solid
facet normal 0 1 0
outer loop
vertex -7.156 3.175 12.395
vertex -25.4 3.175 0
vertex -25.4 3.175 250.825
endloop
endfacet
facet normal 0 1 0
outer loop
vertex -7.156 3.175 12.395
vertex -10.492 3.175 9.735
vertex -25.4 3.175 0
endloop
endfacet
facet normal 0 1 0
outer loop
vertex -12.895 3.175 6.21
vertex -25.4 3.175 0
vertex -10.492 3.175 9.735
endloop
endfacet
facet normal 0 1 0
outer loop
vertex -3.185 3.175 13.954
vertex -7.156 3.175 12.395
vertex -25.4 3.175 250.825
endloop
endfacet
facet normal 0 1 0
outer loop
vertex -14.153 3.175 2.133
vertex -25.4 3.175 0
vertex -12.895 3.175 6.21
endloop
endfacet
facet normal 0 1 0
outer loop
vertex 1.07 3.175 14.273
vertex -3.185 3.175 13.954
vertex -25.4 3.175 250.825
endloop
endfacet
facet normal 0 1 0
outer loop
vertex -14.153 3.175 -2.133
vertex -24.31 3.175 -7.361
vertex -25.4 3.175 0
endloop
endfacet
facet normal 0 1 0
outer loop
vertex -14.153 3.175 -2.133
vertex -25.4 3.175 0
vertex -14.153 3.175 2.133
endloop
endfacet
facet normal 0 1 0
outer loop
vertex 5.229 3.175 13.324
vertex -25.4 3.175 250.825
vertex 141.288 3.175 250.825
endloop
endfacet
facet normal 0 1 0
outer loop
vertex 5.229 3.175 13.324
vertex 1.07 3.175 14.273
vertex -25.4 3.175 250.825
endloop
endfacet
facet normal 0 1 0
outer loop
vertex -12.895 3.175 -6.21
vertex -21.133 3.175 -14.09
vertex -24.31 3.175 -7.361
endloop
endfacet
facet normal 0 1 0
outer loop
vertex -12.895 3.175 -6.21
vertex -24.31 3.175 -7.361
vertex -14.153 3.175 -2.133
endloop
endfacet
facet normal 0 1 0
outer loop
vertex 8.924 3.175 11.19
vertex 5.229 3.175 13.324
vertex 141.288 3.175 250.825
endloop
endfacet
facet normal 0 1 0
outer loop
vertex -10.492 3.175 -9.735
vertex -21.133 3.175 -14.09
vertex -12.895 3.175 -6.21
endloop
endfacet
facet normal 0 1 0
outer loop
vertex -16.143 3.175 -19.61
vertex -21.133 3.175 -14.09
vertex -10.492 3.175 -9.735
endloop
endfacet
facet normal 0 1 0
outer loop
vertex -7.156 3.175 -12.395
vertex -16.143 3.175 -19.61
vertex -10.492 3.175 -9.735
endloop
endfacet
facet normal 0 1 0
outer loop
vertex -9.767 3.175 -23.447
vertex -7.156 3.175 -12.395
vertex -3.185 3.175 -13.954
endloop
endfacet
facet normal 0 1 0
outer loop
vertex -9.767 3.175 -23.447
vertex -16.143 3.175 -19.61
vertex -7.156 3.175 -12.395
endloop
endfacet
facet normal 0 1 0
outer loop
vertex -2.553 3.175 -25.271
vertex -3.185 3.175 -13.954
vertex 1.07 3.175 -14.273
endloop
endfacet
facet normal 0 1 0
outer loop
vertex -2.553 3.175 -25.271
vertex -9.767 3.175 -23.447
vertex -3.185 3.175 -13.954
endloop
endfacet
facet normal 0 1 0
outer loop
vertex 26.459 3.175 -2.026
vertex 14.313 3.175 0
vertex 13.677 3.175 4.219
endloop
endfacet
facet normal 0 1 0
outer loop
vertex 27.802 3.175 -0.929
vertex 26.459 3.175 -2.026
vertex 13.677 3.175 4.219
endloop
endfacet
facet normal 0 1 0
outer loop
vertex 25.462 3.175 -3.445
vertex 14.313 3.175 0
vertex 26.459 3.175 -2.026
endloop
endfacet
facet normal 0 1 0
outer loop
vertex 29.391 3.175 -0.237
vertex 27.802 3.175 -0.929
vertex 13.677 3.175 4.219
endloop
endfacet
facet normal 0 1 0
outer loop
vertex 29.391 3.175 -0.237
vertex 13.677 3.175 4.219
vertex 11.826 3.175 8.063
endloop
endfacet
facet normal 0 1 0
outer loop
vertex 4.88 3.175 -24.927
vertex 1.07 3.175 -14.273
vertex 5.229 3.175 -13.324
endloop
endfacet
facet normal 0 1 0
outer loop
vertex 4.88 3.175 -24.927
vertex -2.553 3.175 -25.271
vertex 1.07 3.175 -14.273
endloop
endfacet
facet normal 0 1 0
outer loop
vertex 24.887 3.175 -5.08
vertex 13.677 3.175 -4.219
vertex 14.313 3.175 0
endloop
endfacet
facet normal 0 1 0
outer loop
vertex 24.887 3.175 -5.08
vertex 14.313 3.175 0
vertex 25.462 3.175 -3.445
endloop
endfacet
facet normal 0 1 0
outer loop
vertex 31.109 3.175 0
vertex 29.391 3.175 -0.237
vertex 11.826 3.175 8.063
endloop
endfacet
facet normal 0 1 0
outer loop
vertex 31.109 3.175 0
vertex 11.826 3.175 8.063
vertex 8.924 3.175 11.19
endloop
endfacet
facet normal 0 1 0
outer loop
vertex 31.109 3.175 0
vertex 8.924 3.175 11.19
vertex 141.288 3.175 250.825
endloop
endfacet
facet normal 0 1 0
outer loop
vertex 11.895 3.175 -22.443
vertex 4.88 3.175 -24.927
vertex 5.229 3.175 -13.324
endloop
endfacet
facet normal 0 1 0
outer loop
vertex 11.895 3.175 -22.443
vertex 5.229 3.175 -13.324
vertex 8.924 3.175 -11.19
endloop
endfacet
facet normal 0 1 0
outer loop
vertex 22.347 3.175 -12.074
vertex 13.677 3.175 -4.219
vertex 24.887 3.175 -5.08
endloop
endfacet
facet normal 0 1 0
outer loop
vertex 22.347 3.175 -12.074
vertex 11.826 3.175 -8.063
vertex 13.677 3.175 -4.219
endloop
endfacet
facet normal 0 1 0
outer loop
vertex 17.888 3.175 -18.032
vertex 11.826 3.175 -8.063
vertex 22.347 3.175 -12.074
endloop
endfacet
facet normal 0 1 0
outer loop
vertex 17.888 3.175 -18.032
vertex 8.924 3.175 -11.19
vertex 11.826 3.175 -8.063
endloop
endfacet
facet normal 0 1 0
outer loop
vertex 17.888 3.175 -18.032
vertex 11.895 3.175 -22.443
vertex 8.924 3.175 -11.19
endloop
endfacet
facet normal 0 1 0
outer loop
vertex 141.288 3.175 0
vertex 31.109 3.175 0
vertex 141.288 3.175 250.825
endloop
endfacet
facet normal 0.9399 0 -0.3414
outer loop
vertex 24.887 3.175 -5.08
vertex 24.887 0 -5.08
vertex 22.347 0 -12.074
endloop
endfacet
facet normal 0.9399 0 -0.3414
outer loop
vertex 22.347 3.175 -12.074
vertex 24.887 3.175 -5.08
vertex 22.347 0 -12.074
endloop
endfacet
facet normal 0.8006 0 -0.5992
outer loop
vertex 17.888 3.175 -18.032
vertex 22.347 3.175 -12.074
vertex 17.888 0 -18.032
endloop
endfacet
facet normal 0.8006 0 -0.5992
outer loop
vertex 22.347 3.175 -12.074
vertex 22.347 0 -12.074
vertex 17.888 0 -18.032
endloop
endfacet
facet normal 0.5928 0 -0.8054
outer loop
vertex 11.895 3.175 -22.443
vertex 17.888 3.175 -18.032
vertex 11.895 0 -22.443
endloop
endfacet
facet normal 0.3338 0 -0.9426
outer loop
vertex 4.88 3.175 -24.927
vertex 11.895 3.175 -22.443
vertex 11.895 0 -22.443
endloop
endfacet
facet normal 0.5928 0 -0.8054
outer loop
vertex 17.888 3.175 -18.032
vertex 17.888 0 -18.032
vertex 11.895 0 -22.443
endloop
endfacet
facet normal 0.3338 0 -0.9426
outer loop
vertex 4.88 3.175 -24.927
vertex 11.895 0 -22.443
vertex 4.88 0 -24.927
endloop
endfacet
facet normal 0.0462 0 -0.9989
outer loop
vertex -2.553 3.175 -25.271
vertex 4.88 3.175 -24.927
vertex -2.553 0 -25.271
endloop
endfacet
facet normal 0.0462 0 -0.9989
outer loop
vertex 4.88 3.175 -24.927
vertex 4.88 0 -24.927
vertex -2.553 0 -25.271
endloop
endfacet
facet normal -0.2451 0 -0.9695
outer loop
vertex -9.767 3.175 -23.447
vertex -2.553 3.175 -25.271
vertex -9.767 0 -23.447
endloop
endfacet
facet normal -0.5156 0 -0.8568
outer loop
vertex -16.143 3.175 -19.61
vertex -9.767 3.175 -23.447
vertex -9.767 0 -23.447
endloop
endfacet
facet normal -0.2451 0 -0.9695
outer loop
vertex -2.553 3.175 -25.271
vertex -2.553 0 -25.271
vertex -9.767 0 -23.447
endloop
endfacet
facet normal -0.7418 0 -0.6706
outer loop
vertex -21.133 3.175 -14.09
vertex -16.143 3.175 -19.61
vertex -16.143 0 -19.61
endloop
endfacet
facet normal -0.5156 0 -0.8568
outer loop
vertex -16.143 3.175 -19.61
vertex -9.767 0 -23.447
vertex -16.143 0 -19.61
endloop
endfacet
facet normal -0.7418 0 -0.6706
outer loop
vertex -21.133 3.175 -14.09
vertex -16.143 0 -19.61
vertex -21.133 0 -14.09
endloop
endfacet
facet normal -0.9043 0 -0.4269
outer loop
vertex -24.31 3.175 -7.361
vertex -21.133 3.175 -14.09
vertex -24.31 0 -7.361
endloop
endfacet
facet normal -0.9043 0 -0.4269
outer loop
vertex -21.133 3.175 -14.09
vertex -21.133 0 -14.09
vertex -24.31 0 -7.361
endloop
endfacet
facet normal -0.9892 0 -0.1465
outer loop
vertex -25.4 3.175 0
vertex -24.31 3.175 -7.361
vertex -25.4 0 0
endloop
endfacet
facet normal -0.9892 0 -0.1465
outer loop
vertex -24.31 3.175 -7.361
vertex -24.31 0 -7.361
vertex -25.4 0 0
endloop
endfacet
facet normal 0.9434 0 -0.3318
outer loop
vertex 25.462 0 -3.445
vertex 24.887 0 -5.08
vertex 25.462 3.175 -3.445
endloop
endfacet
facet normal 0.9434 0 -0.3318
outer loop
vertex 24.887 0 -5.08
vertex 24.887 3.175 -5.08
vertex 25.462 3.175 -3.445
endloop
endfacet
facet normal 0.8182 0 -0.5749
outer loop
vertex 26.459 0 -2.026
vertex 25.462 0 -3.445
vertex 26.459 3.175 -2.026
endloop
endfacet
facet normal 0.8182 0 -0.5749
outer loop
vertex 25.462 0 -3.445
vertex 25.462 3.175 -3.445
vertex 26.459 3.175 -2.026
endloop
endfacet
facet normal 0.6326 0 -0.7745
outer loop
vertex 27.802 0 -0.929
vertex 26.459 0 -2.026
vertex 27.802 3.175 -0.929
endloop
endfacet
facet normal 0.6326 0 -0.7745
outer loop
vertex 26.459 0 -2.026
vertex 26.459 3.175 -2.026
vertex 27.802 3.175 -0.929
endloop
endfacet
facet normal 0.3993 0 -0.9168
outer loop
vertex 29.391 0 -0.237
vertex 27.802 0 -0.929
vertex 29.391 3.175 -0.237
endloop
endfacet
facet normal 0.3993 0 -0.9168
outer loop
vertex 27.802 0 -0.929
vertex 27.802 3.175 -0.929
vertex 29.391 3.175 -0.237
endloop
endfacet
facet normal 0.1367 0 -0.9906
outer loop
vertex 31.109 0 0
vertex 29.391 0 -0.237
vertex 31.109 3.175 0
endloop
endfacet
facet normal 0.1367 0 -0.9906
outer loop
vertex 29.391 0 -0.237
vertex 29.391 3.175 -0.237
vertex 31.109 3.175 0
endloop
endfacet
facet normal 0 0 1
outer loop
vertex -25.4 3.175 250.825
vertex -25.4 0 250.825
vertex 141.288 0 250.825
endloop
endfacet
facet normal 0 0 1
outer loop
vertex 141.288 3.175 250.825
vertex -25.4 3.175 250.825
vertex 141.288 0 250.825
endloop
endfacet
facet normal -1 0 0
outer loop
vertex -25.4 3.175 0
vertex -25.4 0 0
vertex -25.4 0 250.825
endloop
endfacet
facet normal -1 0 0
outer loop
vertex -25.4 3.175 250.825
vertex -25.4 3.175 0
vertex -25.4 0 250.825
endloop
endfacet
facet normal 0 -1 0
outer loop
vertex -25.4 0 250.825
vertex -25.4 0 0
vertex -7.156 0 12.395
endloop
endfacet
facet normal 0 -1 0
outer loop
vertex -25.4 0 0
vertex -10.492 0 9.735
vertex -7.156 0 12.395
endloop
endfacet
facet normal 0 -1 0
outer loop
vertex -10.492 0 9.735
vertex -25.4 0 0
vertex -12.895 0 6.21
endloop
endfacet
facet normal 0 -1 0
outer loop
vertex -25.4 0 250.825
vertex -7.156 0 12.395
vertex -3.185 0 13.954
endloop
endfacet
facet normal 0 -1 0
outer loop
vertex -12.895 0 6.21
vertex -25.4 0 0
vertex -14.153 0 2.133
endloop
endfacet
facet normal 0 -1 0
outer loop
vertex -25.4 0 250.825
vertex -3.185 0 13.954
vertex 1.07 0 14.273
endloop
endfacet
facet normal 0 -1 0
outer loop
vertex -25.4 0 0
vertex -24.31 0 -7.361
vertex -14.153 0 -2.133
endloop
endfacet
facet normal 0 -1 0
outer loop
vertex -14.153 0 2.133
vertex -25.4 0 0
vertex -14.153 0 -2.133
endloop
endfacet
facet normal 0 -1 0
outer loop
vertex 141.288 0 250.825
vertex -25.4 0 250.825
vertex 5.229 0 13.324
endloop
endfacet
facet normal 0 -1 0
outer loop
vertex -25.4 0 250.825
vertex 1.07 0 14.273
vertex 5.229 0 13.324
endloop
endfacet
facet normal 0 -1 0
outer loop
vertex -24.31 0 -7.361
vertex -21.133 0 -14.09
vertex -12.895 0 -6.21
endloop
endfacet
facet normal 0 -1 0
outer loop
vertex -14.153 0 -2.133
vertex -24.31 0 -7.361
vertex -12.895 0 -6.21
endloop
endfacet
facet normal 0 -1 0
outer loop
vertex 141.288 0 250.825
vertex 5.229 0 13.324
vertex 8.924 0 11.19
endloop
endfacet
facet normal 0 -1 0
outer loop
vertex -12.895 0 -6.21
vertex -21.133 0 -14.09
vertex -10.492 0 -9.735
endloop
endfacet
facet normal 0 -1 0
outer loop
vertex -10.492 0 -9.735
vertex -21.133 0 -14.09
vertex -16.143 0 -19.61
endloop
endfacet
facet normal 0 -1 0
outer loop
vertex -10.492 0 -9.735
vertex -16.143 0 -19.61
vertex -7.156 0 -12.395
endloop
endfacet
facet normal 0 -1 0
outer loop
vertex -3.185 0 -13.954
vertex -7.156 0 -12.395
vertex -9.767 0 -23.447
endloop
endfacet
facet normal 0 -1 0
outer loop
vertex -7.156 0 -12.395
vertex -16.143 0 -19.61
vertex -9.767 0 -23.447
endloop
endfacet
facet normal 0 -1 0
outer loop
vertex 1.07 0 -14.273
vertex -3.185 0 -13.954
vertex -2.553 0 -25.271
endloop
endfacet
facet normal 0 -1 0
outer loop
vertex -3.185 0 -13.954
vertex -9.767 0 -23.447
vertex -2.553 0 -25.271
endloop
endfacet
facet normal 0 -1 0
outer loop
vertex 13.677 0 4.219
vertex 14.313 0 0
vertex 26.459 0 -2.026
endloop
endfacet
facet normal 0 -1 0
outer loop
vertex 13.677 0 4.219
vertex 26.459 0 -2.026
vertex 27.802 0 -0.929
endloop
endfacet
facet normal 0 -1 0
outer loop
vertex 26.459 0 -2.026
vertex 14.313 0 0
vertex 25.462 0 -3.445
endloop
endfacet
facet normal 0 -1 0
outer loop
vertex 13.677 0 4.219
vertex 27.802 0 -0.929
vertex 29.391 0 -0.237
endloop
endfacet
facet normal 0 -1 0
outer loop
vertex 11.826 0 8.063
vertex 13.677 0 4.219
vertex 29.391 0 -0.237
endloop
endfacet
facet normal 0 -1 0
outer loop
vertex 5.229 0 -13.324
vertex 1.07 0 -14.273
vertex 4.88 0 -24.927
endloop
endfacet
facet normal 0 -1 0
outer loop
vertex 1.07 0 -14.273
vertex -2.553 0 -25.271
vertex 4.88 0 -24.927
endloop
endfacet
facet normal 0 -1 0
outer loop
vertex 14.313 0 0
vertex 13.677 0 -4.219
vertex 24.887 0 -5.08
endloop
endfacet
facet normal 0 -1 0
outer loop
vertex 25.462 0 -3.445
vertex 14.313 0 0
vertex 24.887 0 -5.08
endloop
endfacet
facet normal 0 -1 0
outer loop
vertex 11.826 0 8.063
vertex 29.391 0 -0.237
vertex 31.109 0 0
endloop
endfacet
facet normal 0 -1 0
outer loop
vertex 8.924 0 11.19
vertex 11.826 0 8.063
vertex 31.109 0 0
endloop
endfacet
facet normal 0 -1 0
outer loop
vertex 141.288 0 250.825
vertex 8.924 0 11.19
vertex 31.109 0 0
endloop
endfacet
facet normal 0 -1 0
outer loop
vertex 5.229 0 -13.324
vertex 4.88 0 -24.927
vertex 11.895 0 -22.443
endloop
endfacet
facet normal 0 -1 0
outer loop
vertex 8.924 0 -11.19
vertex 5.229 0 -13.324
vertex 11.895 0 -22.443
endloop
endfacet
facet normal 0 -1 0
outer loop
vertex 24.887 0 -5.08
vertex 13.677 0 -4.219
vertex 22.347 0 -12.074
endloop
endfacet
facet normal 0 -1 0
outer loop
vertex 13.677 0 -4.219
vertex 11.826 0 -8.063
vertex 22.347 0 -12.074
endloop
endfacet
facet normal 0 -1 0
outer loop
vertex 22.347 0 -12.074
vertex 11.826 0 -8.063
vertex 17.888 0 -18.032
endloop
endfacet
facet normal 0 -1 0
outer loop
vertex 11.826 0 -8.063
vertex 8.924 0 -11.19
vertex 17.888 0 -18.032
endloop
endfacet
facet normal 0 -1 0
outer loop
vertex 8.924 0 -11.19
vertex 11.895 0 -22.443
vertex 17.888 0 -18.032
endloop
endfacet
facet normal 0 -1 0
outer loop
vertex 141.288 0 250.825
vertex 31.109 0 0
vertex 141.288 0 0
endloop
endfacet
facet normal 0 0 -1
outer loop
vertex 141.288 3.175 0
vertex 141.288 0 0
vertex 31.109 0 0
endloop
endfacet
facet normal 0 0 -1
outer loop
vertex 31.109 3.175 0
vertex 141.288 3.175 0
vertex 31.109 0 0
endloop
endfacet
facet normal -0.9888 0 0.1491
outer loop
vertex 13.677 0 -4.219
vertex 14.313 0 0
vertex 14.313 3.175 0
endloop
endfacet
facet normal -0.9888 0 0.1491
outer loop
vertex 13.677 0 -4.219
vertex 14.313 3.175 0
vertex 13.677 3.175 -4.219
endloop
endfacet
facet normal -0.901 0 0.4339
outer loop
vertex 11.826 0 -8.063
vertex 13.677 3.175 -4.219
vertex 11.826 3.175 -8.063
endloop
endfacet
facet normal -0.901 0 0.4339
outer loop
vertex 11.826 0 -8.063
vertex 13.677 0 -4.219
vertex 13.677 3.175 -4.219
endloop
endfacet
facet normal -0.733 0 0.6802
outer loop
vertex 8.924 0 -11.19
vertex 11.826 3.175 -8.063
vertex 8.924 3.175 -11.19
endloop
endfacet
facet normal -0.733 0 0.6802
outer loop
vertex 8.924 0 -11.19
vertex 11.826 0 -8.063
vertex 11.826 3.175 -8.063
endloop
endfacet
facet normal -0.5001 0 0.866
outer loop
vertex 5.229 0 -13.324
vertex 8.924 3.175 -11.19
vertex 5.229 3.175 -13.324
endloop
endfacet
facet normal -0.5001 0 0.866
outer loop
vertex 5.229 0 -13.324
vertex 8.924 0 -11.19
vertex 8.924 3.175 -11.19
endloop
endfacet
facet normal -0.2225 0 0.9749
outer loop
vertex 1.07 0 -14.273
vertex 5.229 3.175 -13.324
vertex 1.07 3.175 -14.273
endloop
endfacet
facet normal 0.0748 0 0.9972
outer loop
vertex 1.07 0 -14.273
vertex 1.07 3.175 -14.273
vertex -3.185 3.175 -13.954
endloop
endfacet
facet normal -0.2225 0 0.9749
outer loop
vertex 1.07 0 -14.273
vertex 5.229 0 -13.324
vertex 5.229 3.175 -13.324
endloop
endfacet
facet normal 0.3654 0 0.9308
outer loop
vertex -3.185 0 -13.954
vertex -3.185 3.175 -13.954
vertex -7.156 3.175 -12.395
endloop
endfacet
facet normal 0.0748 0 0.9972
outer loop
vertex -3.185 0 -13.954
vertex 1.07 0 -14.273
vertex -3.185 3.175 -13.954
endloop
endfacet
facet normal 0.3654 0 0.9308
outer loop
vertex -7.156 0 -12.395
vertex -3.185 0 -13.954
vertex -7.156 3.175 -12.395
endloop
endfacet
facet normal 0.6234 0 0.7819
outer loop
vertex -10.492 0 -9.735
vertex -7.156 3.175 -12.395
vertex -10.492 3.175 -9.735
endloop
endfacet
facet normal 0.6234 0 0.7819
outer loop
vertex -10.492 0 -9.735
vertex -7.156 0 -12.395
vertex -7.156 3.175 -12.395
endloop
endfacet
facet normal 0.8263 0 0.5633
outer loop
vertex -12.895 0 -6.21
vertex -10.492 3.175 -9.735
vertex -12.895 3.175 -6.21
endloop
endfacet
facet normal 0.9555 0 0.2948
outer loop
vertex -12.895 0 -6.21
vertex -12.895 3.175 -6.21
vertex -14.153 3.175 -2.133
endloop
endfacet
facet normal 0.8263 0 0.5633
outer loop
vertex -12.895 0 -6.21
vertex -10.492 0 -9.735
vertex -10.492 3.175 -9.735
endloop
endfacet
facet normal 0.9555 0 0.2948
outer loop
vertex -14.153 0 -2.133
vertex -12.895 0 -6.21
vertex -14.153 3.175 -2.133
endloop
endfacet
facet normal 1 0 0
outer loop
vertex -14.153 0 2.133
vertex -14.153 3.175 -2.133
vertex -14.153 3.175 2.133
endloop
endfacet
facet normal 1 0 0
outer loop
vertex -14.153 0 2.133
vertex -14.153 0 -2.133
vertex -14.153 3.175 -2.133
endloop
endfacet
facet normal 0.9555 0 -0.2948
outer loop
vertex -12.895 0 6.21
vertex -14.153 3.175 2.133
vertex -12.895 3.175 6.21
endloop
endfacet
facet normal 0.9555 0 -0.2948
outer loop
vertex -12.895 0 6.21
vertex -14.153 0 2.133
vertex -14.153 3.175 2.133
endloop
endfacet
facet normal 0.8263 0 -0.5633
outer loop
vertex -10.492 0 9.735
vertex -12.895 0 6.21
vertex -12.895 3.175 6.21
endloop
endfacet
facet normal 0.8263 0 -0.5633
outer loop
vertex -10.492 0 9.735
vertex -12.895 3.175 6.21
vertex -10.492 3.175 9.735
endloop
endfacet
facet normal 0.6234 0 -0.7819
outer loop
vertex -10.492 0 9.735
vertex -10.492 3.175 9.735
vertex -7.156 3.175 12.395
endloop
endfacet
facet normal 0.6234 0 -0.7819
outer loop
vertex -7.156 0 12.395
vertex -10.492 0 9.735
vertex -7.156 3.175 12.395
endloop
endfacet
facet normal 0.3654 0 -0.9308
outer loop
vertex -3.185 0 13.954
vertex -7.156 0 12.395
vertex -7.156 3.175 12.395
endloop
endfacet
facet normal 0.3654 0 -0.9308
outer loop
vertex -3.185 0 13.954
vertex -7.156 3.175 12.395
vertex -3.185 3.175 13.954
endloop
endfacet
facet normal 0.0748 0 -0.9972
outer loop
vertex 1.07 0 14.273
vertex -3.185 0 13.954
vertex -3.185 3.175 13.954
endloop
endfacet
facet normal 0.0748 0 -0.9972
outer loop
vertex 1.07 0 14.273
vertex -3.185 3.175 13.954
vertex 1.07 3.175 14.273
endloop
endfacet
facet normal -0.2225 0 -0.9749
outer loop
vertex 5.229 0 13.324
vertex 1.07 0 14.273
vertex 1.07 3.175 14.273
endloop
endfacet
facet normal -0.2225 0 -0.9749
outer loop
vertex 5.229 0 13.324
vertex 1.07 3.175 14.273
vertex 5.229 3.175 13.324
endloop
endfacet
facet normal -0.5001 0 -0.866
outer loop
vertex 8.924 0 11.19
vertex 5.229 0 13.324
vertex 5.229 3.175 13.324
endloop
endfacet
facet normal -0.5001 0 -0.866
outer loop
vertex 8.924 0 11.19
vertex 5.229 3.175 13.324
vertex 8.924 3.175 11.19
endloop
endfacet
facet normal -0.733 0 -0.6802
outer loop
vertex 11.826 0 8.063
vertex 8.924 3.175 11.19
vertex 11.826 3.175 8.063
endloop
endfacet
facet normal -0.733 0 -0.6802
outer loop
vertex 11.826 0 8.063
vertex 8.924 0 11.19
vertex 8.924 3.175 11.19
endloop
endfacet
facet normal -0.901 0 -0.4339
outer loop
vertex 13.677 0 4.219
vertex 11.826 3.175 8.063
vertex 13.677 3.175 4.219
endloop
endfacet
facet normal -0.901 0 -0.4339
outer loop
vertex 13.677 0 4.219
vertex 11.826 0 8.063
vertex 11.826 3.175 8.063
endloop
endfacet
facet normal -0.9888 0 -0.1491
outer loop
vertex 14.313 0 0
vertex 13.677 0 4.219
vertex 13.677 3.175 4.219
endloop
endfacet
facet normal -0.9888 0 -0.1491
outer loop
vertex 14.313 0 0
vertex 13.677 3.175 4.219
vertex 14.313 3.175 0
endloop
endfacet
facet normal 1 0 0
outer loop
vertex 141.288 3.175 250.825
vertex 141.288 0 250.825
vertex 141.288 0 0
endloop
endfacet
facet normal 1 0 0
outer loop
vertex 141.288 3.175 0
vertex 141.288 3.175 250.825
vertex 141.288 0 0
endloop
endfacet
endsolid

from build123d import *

# Parameters (mm, degrees)
SKETCH1_R           = 14.3129
BOSS_EXTRUDE1_DEPTH = 3.175
FILLET2_R           = 6.35


with BuildPart() as part:
    # Sketch1 → Boss-Extrude1 (new body)
    with BuildSketch(Plane(origin=(0, 0, 0), x_dir=(1, 0, 0), z_dir=(0, 1, 0))):
        with BuildLine():
            Line((-25.4, 0), (-25.4, -250.825))
            Line((-25.4, -250.825), (141.2875, -250.825))
            Line((141.2875, -250.825), (141.2875, 0))
            Line((141.2875, 0), (25.4, 0))
            ThreePointArc((25.4, 0), (0, 25.4), (-25.4, 0))
        make_face()
        Circle(SKETCH1_R, mode=Mode.SUBTRACT)
    extrude(amount=BOSS_EXTRUDE1_DEPTH)

    # Fillet2
    fillet2_edges = [part.edges().sort_by_distance(p)[0] for p in [
        (25.4, 1.5875, 0),
    ]]
    fillet(fillet2_edges, radius=FILLET2_R)


solid = part.part
